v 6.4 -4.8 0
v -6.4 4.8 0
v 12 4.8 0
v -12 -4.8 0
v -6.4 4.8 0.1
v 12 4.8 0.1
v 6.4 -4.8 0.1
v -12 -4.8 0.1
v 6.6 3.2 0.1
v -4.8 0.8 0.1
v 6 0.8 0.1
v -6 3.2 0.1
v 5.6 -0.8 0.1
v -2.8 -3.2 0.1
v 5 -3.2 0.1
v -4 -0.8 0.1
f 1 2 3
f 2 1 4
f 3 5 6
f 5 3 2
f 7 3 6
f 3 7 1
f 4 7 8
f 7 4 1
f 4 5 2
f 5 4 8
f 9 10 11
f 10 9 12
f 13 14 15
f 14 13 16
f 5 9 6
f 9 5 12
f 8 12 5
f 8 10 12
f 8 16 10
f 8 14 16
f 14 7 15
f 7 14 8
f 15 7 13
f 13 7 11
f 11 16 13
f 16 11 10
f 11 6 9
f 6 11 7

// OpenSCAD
// file: 820673i.scad
use <../lib.scad>
function ldraw_lib__820673i() = [
// 0 Sticker  1.2 x  3 Left Parallelogram with Two White Lines
// 0 Name: 820673i.dat
// 0 Author: Takeshi Takahashi [RainbowDolphin]
// 0 !LDRAW_ORG Part UPDATE 2022-05
// 0 !LICENSE Licensed under CC BY 2.0 and CC BY 4.0 : see CAreadme.txt
// 
// 0 BFC CERTIFY CCW
  [0,"BFC","CERTIFY"],
  [0,"BFC","CCW"],
// 
// 0 !KEYWORDS harbour, Seaport, Set 6542, ship
// 
// 0 !HISTORY 2022-09-15 [PTadmin] Official Update 2022-05
// 
// 
// 0 // Sticker box
// 4 16 16 0 12 30 0 -12 -16 0 -12 -30 0 12
  [4,16,16,0,12,30,0,-12,-16,0,-12,-30,0,12],
// 4 16 -30 -.25 12 16 -.25 12 16 0 12 -30 0 12
  [4,16,-30,-.25,12,16,-.25,12,16,0,12,-30,0,12],
// 4 16 -16 -.25 -12 -30 -.25 12 -30 0 12 -16 0 -12
  [4,16,-16,-.25,-12,-30,-.25,12,-30,0,12,-16,0,-12],
// 4 16 30 -.25 -12 -16 -.25 -12 -16 0 -12 30 0 -12
  [4,16,30,-.25,-12,-16,-.25,-12,-16,0,-12,30,0,-12],
// 4 16 16 -.25 12 30 -.25 -12 30 0 -12 16 0 12
  [4,16,16,-.25,12,30,-.25,-12,30,0,-12,16,0,12],
// 0 BFC NOCLIP
  [0,"BFC","NOCLIP"],
// 4 15 15 -.25 8 -16.5 -.25 8 -15 -.25 2 12 -.25 2
  [4,15,15,-.25,8,-16.5,-.25,8,-15,-.25,2,12,-.25,2],
// 4 15 10 -.25 -2 -14 -.25 -2 -12.5 -.25 -8 7 -.25 -8
  [4,15,10,-.25,-2,-14,-.25,-2,-12.5,-.25,-8,7,-.25,-8],
// 0 BFC CLIP
  [0,"BFC","CLIP"],
// 4 16 16 -.25 12 -30 -.25 12 -16.5 -.25 8 15 -.25 8
  [4,16,16,-.25,12,-30,-.25,12,-16.5,-.25,8,15,-.25,8],
// 3 16 16 -.25 12 15 -.25 8 30 -.25 -12
  [3,16,16,-.25,12,15,-.25,8,30,-.25,-12],
// 3 16 15 -.25 8 12 -.25 2 30 -.25 -12
  [3,16,15,-.25,8,12,-.25,2,30,-.25,-12],
// 3 16 12 -.25 2 10 -.25 -2 30 -.25 -12
  [3,16,12,-.25,2,10,-.25,-2,30,-.25,-12],
// 3 16 10 -.25 -2 7 -.25 -8 30 -.25 -12
  [3,16,10,-.25,-2,7,-.25,-8,30,-.25,-12],
// 4 16 -16 -.25 -12 30 -.25 -12 7 -.25 -8 -12.5 -.25 -8
  [4,16,-16,-.25,-12,30,-.25,-12,7,-.25,-8,-12.5,-.25,-8],
// 3 16 -14 -.25 -2 -16 -.25 -12 -12.5 -.25 -8
  [3,16,-14,-.25,-2,-16,-.25,-12,-12.5,-.25,-8],
// 3 16 -15 -.25 2 -16 -.25 -12 -14 -.25 -2
  [3,16,-15,-.25,2,-16,-.25,-12,-14,-.25,-2],
// 4 16 12 -.25 2 -15 -.25 2 -14 -.25 -2 10 -.25 -2
  [4,16,12,-.25,2,-15,-.25,2,-14,-.25,-2,10,-.25,-2],
// 4 16 -16 -.25 -12 -15 -.25 2 -16.5 -.25 8 -30 -.25 12
  [4,16,-16,-.25,-12,-15,-.25,2,-16.5,-.25,8,-30,-.25,12],
];
makepoly(ldraw_lib__820673i(), line=0.2);
// main file
use <../lib.scad>
use <820673i.scad>
function ldraw_lib__820673h() = [
// 0 Sticker  1.2 x  3 Right Parallelogram with Two White Lines
// 0 Name: 820673h.dat
// 0 Author: Takeshi Takahashi [RainbowDolphin]
// 0 !LDRAW_ORG Part UPDATE 2022-05
// 0 !LICENSE Licensed under CC BY 2.0 and CC BY 4.0 : see CAreadme.txt
// 
// 0 BFC CERTIFY CCW
  [0,"BFC","CERTIFY"],
  [0,"BFC","CCW"],
// 
// 0 !KEYWORDS harbour, Seaport, Set 6542, ship
// 
// 0 !HISTORY 2022-09-15 [PTadmin] Official Update 2022-05
// 
// 
// 1 16 0 0 0 -1 0 0 0 1 0 0 0 1 820673i.dat
  [1,16,0,0,0,-1,0,0,0,1,0,0,0,1, ldraw_lib__820673i()],
];
makepoly(ldraw_lib__820673h(), line=0.2);
